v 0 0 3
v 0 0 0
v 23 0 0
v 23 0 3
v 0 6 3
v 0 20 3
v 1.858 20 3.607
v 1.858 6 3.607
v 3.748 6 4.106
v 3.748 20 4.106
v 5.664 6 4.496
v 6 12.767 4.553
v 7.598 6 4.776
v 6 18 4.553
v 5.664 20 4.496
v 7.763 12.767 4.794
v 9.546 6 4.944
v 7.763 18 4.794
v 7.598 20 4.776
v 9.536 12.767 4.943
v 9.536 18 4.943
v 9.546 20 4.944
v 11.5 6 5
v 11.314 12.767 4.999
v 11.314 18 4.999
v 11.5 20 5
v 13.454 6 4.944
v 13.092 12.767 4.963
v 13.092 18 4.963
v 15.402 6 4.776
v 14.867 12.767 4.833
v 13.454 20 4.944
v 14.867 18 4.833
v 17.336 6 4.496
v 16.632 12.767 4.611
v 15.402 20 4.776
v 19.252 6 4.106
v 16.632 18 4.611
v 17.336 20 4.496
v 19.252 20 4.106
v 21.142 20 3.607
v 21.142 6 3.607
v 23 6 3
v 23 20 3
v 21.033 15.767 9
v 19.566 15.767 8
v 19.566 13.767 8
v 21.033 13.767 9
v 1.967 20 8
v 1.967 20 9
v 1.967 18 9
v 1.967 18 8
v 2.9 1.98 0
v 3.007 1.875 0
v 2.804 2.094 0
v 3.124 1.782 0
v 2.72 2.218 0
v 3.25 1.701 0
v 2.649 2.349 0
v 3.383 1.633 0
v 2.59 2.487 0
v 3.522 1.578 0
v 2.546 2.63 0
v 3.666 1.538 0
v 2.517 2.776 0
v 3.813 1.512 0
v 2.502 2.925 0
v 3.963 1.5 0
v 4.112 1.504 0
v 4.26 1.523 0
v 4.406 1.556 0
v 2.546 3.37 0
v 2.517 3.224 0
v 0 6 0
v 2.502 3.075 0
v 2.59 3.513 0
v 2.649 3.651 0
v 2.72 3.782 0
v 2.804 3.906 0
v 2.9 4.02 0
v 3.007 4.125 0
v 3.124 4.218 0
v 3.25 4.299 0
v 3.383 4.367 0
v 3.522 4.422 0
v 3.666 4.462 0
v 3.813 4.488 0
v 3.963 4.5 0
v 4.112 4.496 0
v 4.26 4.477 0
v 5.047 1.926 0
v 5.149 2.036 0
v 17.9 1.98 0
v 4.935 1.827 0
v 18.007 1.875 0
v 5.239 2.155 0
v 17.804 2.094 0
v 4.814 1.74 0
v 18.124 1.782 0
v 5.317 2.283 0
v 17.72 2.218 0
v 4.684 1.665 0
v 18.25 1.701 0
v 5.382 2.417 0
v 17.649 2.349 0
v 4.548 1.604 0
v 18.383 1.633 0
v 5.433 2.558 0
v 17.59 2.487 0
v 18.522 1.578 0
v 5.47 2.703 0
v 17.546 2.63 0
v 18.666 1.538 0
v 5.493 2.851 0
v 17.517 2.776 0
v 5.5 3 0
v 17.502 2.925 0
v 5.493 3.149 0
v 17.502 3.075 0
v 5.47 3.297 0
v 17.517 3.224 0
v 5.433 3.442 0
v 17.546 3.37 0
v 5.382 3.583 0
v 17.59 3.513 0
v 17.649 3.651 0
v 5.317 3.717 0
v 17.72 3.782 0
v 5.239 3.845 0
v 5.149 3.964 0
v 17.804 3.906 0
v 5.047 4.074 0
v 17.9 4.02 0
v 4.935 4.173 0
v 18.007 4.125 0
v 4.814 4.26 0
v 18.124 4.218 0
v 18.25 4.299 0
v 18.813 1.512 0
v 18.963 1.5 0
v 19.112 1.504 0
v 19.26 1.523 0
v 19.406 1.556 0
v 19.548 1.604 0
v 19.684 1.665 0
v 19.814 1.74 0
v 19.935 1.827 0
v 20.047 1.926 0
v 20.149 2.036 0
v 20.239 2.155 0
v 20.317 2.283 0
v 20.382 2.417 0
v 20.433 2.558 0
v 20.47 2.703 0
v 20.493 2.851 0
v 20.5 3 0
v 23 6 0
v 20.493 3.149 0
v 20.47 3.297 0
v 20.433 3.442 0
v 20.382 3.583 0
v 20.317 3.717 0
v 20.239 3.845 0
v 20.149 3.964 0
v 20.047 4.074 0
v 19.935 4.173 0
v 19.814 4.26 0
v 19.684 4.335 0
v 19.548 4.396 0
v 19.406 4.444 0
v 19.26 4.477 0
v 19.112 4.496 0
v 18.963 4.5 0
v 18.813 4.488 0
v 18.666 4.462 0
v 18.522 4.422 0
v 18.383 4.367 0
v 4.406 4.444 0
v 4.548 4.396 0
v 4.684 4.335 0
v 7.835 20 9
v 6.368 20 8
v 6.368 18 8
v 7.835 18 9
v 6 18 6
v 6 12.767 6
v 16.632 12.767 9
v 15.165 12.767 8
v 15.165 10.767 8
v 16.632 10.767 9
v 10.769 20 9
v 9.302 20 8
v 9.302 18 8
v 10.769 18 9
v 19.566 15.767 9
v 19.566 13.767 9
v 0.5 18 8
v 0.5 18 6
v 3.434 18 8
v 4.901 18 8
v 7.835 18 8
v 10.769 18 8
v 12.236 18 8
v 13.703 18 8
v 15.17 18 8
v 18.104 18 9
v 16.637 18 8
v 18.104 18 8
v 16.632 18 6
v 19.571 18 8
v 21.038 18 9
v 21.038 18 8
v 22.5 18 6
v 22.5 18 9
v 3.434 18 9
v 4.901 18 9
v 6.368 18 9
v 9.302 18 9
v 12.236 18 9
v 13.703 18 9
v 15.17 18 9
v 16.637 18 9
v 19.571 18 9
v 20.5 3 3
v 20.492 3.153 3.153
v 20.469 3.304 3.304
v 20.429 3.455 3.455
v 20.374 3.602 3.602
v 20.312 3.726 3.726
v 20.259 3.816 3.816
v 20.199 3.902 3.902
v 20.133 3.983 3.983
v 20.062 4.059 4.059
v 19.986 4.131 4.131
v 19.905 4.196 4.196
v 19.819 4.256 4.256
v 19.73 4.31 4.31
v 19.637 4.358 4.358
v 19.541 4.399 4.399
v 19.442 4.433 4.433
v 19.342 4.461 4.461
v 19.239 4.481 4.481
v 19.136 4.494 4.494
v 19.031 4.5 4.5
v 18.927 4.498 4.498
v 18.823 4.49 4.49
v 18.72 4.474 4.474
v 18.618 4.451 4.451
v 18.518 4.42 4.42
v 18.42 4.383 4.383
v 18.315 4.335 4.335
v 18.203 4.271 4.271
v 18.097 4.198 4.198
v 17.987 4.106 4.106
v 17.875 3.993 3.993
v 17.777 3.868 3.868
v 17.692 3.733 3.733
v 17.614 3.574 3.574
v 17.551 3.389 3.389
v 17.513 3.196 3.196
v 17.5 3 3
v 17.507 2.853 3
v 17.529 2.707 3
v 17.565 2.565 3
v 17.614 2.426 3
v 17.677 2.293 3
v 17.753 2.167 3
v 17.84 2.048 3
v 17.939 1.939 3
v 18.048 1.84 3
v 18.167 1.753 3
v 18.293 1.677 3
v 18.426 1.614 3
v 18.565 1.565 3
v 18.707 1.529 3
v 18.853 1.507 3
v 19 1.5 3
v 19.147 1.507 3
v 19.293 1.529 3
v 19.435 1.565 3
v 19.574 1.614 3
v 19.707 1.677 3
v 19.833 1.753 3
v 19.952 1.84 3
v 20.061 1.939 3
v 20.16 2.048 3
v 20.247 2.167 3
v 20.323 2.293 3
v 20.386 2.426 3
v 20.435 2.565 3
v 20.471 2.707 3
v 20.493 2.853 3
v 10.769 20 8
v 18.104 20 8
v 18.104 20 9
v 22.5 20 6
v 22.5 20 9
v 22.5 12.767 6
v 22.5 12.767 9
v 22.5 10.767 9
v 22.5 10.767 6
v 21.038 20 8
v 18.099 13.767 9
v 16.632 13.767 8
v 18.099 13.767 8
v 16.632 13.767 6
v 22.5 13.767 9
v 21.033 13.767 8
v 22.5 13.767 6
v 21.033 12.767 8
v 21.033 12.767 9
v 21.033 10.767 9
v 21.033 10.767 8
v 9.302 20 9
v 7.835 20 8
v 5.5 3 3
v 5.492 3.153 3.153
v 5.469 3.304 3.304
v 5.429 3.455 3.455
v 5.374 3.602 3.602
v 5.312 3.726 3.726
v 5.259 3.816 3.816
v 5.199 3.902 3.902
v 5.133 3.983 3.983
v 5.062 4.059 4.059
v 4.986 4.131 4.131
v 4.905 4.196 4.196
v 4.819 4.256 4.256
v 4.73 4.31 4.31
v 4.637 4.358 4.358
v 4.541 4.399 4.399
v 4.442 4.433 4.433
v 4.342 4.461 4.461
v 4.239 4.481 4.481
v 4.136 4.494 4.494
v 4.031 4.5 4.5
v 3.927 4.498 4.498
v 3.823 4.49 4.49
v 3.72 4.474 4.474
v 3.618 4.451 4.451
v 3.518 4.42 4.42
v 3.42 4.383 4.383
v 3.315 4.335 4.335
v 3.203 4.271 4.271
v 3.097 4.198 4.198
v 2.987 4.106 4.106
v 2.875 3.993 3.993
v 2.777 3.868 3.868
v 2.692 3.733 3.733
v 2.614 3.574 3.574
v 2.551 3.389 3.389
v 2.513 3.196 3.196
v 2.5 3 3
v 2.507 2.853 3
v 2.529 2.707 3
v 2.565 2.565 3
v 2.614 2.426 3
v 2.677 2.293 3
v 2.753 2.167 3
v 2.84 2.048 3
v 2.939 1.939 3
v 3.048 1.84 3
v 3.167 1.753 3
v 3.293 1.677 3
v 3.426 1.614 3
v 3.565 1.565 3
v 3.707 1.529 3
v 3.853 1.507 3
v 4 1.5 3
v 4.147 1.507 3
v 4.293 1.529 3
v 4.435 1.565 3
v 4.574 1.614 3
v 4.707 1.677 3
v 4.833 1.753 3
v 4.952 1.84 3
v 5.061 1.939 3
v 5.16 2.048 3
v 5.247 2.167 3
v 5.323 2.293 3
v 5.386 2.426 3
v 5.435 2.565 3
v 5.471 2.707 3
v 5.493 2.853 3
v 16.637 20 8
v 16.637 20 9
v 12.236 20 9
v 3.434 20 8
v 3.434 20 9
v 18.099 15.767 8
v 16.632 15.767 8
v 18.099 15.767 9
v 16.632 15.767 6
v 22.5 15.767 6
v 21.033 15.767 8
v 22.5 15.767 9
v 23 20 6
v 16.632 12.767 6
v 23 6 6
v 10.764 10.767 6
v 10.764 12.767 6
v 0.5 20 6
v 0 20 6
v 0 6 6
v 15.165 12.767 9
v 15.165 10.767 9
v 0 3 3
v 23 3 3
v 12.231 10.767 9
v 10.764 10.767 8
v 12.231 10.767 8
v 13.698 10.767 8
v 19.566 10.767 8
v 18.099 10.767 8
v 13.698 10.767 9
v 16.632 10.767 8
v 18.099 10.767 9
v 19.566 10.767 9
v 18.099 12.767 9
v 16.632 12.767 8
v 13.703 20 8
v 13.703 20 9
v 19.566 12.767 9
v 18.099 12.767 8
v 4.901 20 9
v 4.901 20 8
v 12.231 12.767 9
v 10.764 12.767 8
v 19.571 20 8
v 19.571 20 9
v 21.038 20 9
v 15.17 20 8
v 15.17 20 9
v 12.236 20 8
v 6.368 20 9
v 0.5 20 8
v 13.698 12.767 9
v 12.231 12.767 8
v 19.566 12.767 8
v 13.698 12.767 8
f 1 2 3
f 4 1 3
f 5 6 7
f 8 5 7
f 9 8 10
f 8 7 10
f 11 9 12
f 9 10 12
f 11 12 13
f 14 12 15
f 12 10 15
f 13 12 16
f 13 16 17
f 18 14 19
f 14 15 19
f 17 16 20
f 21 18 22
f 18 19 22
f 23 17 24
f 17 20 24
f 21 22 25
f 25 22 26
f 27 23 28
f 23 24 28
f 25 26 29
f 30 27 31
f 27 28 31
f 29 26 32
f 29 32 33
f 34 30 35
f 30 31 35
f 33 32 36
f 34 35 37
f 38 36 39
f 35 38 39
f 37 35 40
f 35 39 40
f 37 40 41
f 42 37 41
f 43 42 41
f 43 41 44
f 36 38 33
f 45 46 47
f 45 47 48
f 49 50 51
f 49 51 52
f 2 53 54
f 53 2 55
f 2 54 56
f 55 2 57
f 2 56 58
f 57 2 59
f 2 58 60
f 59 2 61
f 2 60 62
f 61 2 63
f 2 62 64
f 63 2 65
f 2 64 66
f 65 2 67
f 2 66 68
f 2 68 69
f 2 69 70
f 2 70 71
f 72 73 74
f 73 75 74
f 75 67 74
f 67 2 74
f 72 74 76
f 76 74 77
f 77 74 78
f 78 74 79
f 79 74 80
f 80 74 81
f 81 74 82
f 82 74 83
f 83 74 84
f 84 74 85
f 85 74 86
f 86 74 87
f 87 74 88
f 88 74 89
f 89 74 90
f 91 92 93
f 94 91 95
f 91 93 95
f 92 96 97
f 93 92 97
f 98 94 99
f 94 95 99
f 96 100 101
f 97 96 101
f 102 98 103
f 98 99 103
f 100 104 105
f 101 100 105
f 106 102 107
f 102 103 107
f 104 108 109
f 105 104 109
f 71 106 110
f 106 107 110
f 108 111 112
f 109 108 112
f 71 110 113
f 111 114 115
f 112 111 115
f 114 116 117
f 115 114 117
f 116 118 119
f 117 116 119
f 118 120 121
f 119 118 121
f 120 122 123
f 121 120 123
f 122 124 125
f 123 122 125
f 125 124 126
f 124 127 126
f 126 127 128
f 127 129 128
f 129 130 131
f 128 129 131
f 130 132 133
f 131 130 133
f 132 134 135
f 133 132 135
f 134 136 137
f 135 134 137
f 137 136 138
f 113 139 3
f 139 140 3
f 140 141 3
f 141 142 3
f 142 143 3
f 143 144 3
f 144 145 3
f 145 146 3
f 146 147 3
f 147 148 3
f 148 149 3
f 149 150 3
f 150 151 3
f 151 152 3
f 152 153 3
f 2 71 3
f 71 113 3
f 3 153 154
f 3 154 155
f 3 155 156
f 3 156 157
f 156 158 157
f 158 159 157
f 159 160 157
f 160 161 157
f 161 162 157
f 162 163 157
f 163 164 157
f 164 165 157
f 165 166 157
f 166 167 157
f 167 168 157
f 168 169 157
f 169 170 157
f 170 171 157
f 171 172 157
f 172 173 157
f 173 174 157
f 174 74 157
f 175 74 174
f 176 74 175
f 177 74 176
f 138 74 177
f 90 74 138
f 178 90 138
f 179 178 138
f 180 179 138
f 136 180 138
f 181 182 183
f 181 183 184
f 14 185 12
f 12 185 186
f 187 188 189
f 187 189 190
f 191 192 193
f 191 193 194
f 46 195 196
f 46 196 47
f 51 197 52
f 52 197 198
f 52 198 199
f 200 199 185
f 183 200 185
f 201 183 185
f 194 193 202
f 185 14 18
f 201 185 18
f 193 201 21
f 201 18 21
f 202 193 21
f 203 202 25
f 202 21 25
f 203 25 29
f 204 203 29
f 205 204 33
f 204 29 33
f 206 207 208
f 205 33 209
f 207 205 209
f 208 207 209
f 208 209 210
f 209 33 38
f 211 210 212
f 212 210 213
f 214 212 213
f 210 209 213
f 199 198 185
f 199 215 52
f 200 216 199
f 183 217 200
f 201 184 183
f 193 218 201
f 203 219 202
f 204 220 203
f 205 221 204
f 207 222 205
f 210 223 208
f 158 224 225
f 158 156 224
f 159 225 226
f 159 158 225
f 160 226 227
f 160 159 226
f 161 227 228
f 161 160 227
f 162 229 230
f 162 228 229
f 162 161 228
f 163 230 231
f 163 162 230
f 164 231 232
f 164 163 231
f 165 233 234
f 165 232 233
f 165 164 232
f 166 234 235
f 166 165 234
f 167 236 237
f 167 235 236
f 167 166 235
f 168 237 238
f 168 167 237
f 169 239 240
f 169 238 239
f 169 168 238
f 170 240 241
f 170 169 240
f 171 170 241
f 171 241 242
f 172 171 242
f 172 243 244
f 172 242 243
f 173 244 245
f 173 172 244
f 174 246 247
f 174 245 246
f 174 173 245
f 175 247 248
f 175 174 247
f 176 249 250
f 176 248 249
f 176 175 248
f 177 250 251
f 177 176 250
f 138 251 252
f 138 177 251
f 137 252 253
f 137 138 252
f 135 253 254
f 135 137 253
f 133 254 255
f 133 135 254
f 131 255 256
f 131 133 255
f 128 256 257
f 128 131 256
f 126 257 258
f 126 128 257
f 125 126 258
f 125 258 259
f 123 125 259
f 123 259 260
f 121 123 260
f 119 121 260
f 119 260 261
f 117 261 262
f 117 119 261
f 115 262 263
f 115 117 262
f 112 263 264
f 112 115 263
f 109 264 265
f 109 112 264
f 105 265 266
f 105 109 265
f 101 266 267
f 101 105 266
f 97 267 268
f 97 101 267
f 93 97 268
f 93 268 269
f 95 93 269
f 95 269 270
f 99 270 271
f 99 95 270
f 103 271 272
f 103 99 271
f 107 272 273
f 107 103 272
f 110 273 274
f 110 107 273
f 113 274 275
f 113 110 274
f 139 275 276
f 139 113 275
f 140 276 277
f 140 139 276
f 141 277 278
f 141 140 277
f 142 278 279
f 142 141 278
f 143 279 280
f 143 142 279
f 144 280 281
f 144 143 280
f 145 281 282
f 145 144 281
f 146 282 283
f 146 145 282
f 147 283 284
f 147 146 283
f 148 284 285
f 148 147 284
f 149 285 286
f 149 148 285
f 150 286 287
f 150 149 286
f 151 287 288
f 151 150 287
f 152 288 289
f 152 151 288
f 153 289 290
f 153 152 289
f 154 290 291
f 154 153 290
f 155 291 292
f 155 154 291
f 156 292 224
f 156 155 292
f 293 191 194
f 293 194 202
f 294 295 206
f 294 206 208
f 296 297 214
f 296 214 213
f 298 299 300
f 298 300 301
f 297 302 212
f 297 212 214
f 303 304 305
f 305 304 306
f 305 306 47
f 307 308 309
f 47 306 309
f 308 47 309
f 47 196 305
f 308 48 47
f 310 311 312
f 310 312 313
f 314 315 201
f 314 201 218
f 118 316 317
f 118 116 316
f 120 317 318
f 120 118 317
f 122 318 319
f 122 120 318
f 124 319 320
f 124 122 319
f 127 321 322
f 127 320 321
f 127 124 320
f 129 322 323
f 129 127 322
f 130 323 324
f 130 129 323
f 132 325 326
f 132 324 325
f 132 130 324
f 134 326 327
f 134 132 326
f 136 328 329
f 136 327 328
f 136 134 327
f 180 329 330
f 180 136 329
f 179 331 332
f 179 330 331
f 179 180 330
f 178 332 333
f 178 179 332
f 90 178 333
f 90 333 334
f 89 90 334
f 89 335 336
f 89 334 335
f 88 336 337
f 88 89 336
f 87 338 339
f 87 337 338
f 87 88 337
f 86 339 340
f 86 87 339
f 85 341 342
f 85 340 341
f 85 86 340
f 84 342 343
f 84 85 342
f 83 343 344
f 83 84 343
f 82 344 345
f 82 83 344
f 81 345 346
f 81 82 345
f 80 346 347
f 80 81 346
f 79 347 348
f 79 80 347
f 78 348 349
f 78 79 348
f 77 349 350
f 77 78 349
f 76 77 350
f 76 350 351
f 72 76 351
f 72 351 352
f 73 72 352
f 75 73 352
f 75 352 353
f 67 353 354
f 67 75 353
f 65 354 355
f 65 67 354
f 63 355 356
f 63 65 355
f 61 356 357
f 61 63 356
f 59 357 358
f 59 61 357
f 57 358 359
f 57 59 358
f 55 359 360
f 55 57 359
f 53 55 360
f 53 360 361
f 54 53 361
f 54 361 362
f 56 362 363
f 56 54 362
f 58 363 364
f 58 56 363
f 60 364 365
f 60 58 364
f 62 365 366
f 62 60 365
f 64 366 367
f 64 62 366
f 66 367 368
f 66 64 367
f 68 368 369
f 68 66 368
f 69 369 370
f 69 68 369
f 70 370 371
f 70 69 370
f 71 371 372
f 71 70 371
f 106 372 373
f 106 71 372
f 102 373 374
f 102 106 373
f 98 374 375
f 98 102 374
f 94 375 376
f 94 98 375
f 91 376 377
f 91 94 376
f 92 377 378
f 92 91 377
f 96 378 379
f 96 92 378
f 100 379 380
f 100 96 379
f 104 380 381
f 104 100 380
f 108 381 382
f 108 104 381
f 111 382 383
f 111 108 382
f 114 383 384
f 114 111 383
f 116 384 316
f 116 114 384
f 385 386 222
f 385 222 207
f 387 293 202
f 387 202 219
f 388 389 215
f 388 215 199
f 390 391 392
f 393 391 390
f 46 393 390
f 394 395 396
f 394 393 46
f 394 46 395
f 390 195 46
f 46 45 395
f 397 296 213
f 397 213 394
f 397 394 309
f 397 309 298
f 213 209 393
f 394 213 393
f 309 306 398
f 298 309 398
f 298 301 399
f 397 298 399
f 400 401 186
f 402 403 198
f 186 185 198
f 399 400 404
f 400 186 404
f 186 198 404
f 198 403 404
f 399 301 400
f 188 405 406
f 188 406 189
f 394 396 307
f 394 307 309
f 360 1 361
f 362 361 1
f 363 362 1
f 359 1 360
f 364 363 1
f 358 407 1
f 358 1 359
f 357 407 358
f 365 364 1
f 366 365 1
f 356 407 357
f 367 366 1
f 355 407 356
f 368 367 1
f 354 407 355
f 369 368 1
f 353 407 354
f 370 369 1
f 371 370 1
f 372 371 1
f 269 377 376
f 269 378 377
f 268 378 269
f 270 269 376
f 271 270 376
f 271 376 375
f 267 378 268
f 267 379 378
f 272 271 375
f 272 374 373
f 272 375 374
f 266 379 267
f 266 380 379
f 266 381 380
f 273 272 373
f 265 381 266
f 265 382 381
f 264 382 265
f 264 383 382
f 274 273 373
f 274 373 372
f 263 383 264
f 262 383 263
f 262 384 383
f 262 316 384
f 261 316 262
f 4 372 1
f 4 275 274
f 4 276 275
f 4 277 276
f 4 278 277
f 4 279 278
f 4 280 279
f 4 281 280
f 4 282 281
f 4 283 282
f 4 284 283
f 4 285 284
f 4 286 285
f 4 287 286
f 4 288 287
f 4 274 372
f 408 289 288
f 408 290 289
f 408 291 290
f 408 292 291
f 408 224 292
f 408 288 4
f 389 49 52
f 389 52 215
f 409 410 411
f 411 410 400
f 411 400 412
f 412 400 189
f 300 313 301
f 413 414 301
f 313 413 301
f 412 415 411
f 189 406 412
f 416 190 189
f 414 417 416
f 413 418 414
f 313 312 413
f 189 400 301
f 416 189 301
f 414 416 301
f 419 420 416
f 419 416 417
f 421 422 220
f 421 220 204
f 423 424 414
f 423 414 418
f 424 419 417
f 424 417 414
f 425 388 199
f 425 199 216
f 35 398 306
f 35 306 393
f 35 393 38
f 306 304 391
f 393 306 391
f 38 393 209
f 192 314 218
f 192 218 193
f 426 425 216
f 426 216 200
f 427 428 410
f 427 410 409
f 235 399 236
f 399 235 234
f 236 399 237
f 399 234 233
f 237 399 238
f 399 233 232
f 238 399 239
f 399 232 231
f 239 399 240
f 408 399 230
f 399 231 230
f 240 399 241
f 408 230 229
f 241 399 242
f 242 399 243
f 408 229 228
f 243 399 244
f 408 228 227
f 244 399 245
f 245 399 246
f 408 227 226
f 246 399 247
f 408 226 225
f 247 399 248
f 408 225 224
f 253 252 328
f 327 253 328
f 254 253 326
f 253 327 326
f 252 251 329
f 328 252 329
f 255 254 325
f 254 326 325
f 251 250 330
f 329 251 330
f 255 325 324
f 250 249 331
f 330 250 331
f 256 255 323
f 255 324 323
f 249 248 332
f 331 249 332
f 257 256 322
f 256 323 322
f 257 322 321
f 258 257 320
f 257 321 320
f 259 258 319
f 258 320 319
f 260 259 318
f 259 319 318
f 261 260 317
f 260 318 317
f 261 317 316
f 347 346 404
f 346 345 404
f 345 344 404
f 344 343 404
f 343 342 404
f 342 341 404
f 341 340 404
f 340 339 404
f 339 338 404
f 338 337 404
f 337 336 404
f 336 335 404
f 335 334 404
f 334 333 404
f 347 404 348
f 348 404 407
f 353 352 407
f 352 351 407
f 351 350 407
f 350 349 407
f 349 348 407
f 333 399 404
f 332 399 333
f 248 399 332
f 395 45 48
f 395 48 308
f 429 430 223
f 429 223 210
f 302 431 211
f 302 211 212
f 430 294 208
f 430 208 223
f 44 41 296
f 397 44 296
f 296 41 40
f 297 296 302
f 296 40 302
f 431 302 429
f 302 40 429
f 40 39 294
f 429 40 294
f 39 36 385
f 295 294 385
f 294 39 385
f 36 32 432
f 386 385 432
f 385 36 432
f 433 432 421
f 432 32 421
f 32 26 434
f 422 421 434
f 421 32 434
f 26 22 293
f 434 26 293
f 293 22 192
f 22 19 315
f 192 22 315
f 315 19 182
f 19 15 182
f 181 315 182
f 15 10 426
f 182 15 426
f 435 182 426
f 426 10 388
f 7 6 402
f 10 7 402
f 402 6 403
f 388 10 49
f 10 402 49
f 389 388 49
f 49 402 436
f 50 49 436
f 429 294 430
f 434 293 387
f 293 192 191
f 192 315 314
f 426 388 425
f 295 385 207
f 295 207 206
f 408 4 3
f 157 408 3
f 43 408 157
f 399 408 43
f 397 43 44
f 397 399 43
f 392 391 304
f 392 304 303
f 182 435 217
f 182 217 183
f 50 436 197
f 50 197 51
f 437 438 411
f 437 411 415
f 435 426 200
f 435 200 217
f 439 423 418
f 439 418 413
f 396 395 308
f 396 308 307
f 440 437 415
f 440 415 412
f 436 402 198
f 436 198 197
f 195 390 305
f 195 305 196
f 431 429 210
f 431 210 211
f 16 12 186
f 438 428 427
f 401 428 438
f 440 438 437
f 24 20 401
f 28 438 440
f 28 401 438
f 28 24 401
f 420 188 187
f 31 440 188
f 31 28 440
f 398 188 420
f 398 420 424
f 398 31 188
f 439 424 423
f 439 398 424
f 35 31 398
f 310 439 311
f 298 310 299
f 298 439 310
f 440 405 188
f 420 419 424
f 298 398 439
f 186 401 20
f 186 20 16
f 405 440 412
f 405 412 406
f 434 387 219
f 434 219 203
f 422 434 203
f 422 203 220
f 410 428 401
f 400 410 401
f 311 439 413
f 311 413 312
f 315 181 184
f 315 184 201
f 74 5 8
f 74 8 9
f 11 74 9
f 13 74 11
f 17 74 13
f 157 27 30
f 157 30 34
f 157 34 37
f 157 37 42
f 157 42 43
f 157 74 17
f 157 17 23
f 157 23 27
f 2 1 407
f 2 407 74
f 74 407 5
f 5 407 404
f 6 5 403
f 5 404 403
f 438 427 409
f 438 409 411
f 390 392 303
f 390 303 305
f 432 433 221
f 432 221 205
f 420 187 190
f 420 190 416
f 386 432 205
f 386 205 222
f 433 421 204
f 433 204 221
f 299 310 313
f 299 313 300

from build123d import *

# Parameters (mm, degrees)
CROQUIS1_W                 = 23
CROQUIS1_H                 = 6
CROQUIS1_R                 = 1.5
SALIENTE_EXTRUIR1_DEPTH    = 3
RECUBRIR1_DEPTH            = 23
CROQUIS2_R                 = 1.5
CORTAR_EXTRUIR1_DEPTH      = 3
CROQUIS3_R                 = 34.0625
CORTAR_EXTRUIR2_DEPTH      = 14
SALIENTE_EXTRUIR2_DEPTH    = 2
SALIENTE_EXTRUIR3_DEPTH    = 2
CROQUIS8_W                 = 11.736
CROQUIS8_H                 = 2
SALIENTE_EXTRUIR4_DEPTH    = 2
CORTAR_EXTRUIR3_REACH      = 33.064
CORTAR_EXTRUIR3_END_RADIUS = 34.0625


# Read off the part's stored shape, not the designer's step: Recubrir1
with BuildPart() as part:
    # Croquis1 → Saliente-Extruir1 (new body)
    with BuildSketch(Plane.XY):
        with Locations((11.5, 3)):
            Rectangle(CROQUIS1_W, CROQUIS1_H)
        with Locations((4, 3)):
            Circle(CROQUIS1_R, mode=Mode.SUBTRACT)
        with Locations((19, 3)):
            Circle(CROQUIS1_R, mode=Mode.SUBTRACT)
    extrude(amount=SALIENTE_EXTRUIR1_DEPTH)

    # Recubrir1 outline → Recubrir1 (add)
    with BuildSketch(Plane.YZ):
        Polygon((3, 3), (20, 3), (20, 6), (6, 6), align=None)
    extrude(amount=RECUBRIR1_DEPTH)

    # Croquis2 → Cortar-Extruir1 (cut)
    with BuildSketch(Plane.XY.offset(3)):
        with Locations((4, 3)):
            Circle(CROQUIS2_R)
        with Locations((19, 3)):
            Circle(CROQUIS2_R)
    extrude(amount=CORTAR_EXTRUIR1_DEPTH, mode=Mode.SUBTRACT)

    # Croquis3 → Cortar-Extruir2 (cut)
    with BuildSketch(Plane(origin=(0, 20, 0), x_dir=(1, 0, 0), z_dir=(0, 1, 0))):
        with Locations((11.5, 29.0625)):
            Circle(CROQUIS3_R)
    extrude(amount=-CORTAR_EXTRUIR2_DEPTH, mode=Mode.SUBTRACT)

    # Croquis6 → Saliente-Extruir2 (add)
    with BuildSketch(Plane(origin=(0, 20, 0), x_dir=(1, 0, 0), z_dir=(0, 1, 0))):
        Polygon((22.5, -6), (0.5, -6), (0.5, -8), (1.967, -9), (1.967, -8), (3.434, -9), (3.434, -8), (4.901, -9), (4.901, -8), (6.368, -9), (6.368, -8), (7.835, -9), (7.835, -8), (9.302, -9), (9.302, -8), (10.769, -9), (10.769, -8), (12.236, -9), (12.236, -8), (13.703, -9), (13.703, -8), (15.17, -9), (15.17, -8), (16.637, -9), (16.637, -8), (18.104, -9), (18.104, -8), (19.571, -9), (19.571, -8), (21.038, -9), (21.038, -8), (22.5, -9), align=None)
    extrude(amount=-SALIENTE_EXTRUIR2_DEPTH)

    # Croquis7 → Saliente-Extruir3 (add)
    with BuildSketch(Plane(origin=(0, 15.767364365, 0), x_dir=(1, 0, 0), z_dir=(0, 1, 0))):
        Polygon((18.099, -9), (18.099, -8), (19.566, -9), (19.566, -8), (21.033, -9), (21.033, -8), (22.5, -9), (22.5, -6), (16.632, -6), (16.632, -8), align=None)
    extrude(amount=-SALIENTE_EXTRUIR3_DEPTH)

    # Croquis8 → Saliente-Extruir4 (add)
    with BuildSketch(Plane(origin=(0, 12.767364365, 0), x_dir=(1, 0, 0), z_dir=(0, 1, 0))):
        with Locations((16.632, -7)):
            Rectangle(CROQUIS8_W, CROQUIS8_H)
        Polygon((15.165, -8), (13.698, -8), (15.165, -9), align=None)
        Polygon((13.698, -8), (12.231, -8), (13.698, -9), align=None)
        Polygon((12.231, -8), (10.764, -8), (12.231, -9), align=None)
        Polygon((16.632, -9), (16.632, -8), (15.165, -8), align=None)
        Polygon((18.099, -9), (18.099, -8), (16.632, -8), align=None)
        Polygon((19.566, -9), (19.566, -8), (18.099, -8), align=None)
        Polygon((21.033, -9), (21.033, -8), (19.566, -8), align=None)
        Polygon((22.5, -9), (22.5, -8), (21.033, -8), align=None)
    extrude(amount=-SALIENTE_EXTRUIR4_DEPTH)

    # Cortar-Extruir3: up to this cylinder (the profile starts outside it)
    cortar_extruir3_end = Plane(origin=(11.5, 15.383682, -29.0625), z_dir=(0, 1, 0)) * Cylinder(CORTAR_EXTRUIR3_END_RADIUS, 135.253, mode=Mode.PRIVATE)
    # Croquis9 → Cortar-Extruir3 (cut, up to the surface)
    with BuildSketch(Plane.XY.offset(6), mode=Mode.PRIVATE) as cortar_extruir3_sk1:
        Polygon((10.764, 12.767364365), (16.632, 12.767364365), (16.632, 13.767364365), (16.632, 15.767364365), (16.632, 18), (6, 18), (6, 12.767364365), align=None)
    cortar_extruir3_tool1 = extrude(cortar_extruir3_sk1.sketch, amount=-CORTAR_EXTRUIR3_REACH, mode=Mode.PRIVATE) - cortar_extruir3_end
    add(cortar_extruir3_tool1.solids().sort_by_distance((11.316, 15.383682, 6))[0], mode=Mode.SUBTRACT)


solid = part.part
